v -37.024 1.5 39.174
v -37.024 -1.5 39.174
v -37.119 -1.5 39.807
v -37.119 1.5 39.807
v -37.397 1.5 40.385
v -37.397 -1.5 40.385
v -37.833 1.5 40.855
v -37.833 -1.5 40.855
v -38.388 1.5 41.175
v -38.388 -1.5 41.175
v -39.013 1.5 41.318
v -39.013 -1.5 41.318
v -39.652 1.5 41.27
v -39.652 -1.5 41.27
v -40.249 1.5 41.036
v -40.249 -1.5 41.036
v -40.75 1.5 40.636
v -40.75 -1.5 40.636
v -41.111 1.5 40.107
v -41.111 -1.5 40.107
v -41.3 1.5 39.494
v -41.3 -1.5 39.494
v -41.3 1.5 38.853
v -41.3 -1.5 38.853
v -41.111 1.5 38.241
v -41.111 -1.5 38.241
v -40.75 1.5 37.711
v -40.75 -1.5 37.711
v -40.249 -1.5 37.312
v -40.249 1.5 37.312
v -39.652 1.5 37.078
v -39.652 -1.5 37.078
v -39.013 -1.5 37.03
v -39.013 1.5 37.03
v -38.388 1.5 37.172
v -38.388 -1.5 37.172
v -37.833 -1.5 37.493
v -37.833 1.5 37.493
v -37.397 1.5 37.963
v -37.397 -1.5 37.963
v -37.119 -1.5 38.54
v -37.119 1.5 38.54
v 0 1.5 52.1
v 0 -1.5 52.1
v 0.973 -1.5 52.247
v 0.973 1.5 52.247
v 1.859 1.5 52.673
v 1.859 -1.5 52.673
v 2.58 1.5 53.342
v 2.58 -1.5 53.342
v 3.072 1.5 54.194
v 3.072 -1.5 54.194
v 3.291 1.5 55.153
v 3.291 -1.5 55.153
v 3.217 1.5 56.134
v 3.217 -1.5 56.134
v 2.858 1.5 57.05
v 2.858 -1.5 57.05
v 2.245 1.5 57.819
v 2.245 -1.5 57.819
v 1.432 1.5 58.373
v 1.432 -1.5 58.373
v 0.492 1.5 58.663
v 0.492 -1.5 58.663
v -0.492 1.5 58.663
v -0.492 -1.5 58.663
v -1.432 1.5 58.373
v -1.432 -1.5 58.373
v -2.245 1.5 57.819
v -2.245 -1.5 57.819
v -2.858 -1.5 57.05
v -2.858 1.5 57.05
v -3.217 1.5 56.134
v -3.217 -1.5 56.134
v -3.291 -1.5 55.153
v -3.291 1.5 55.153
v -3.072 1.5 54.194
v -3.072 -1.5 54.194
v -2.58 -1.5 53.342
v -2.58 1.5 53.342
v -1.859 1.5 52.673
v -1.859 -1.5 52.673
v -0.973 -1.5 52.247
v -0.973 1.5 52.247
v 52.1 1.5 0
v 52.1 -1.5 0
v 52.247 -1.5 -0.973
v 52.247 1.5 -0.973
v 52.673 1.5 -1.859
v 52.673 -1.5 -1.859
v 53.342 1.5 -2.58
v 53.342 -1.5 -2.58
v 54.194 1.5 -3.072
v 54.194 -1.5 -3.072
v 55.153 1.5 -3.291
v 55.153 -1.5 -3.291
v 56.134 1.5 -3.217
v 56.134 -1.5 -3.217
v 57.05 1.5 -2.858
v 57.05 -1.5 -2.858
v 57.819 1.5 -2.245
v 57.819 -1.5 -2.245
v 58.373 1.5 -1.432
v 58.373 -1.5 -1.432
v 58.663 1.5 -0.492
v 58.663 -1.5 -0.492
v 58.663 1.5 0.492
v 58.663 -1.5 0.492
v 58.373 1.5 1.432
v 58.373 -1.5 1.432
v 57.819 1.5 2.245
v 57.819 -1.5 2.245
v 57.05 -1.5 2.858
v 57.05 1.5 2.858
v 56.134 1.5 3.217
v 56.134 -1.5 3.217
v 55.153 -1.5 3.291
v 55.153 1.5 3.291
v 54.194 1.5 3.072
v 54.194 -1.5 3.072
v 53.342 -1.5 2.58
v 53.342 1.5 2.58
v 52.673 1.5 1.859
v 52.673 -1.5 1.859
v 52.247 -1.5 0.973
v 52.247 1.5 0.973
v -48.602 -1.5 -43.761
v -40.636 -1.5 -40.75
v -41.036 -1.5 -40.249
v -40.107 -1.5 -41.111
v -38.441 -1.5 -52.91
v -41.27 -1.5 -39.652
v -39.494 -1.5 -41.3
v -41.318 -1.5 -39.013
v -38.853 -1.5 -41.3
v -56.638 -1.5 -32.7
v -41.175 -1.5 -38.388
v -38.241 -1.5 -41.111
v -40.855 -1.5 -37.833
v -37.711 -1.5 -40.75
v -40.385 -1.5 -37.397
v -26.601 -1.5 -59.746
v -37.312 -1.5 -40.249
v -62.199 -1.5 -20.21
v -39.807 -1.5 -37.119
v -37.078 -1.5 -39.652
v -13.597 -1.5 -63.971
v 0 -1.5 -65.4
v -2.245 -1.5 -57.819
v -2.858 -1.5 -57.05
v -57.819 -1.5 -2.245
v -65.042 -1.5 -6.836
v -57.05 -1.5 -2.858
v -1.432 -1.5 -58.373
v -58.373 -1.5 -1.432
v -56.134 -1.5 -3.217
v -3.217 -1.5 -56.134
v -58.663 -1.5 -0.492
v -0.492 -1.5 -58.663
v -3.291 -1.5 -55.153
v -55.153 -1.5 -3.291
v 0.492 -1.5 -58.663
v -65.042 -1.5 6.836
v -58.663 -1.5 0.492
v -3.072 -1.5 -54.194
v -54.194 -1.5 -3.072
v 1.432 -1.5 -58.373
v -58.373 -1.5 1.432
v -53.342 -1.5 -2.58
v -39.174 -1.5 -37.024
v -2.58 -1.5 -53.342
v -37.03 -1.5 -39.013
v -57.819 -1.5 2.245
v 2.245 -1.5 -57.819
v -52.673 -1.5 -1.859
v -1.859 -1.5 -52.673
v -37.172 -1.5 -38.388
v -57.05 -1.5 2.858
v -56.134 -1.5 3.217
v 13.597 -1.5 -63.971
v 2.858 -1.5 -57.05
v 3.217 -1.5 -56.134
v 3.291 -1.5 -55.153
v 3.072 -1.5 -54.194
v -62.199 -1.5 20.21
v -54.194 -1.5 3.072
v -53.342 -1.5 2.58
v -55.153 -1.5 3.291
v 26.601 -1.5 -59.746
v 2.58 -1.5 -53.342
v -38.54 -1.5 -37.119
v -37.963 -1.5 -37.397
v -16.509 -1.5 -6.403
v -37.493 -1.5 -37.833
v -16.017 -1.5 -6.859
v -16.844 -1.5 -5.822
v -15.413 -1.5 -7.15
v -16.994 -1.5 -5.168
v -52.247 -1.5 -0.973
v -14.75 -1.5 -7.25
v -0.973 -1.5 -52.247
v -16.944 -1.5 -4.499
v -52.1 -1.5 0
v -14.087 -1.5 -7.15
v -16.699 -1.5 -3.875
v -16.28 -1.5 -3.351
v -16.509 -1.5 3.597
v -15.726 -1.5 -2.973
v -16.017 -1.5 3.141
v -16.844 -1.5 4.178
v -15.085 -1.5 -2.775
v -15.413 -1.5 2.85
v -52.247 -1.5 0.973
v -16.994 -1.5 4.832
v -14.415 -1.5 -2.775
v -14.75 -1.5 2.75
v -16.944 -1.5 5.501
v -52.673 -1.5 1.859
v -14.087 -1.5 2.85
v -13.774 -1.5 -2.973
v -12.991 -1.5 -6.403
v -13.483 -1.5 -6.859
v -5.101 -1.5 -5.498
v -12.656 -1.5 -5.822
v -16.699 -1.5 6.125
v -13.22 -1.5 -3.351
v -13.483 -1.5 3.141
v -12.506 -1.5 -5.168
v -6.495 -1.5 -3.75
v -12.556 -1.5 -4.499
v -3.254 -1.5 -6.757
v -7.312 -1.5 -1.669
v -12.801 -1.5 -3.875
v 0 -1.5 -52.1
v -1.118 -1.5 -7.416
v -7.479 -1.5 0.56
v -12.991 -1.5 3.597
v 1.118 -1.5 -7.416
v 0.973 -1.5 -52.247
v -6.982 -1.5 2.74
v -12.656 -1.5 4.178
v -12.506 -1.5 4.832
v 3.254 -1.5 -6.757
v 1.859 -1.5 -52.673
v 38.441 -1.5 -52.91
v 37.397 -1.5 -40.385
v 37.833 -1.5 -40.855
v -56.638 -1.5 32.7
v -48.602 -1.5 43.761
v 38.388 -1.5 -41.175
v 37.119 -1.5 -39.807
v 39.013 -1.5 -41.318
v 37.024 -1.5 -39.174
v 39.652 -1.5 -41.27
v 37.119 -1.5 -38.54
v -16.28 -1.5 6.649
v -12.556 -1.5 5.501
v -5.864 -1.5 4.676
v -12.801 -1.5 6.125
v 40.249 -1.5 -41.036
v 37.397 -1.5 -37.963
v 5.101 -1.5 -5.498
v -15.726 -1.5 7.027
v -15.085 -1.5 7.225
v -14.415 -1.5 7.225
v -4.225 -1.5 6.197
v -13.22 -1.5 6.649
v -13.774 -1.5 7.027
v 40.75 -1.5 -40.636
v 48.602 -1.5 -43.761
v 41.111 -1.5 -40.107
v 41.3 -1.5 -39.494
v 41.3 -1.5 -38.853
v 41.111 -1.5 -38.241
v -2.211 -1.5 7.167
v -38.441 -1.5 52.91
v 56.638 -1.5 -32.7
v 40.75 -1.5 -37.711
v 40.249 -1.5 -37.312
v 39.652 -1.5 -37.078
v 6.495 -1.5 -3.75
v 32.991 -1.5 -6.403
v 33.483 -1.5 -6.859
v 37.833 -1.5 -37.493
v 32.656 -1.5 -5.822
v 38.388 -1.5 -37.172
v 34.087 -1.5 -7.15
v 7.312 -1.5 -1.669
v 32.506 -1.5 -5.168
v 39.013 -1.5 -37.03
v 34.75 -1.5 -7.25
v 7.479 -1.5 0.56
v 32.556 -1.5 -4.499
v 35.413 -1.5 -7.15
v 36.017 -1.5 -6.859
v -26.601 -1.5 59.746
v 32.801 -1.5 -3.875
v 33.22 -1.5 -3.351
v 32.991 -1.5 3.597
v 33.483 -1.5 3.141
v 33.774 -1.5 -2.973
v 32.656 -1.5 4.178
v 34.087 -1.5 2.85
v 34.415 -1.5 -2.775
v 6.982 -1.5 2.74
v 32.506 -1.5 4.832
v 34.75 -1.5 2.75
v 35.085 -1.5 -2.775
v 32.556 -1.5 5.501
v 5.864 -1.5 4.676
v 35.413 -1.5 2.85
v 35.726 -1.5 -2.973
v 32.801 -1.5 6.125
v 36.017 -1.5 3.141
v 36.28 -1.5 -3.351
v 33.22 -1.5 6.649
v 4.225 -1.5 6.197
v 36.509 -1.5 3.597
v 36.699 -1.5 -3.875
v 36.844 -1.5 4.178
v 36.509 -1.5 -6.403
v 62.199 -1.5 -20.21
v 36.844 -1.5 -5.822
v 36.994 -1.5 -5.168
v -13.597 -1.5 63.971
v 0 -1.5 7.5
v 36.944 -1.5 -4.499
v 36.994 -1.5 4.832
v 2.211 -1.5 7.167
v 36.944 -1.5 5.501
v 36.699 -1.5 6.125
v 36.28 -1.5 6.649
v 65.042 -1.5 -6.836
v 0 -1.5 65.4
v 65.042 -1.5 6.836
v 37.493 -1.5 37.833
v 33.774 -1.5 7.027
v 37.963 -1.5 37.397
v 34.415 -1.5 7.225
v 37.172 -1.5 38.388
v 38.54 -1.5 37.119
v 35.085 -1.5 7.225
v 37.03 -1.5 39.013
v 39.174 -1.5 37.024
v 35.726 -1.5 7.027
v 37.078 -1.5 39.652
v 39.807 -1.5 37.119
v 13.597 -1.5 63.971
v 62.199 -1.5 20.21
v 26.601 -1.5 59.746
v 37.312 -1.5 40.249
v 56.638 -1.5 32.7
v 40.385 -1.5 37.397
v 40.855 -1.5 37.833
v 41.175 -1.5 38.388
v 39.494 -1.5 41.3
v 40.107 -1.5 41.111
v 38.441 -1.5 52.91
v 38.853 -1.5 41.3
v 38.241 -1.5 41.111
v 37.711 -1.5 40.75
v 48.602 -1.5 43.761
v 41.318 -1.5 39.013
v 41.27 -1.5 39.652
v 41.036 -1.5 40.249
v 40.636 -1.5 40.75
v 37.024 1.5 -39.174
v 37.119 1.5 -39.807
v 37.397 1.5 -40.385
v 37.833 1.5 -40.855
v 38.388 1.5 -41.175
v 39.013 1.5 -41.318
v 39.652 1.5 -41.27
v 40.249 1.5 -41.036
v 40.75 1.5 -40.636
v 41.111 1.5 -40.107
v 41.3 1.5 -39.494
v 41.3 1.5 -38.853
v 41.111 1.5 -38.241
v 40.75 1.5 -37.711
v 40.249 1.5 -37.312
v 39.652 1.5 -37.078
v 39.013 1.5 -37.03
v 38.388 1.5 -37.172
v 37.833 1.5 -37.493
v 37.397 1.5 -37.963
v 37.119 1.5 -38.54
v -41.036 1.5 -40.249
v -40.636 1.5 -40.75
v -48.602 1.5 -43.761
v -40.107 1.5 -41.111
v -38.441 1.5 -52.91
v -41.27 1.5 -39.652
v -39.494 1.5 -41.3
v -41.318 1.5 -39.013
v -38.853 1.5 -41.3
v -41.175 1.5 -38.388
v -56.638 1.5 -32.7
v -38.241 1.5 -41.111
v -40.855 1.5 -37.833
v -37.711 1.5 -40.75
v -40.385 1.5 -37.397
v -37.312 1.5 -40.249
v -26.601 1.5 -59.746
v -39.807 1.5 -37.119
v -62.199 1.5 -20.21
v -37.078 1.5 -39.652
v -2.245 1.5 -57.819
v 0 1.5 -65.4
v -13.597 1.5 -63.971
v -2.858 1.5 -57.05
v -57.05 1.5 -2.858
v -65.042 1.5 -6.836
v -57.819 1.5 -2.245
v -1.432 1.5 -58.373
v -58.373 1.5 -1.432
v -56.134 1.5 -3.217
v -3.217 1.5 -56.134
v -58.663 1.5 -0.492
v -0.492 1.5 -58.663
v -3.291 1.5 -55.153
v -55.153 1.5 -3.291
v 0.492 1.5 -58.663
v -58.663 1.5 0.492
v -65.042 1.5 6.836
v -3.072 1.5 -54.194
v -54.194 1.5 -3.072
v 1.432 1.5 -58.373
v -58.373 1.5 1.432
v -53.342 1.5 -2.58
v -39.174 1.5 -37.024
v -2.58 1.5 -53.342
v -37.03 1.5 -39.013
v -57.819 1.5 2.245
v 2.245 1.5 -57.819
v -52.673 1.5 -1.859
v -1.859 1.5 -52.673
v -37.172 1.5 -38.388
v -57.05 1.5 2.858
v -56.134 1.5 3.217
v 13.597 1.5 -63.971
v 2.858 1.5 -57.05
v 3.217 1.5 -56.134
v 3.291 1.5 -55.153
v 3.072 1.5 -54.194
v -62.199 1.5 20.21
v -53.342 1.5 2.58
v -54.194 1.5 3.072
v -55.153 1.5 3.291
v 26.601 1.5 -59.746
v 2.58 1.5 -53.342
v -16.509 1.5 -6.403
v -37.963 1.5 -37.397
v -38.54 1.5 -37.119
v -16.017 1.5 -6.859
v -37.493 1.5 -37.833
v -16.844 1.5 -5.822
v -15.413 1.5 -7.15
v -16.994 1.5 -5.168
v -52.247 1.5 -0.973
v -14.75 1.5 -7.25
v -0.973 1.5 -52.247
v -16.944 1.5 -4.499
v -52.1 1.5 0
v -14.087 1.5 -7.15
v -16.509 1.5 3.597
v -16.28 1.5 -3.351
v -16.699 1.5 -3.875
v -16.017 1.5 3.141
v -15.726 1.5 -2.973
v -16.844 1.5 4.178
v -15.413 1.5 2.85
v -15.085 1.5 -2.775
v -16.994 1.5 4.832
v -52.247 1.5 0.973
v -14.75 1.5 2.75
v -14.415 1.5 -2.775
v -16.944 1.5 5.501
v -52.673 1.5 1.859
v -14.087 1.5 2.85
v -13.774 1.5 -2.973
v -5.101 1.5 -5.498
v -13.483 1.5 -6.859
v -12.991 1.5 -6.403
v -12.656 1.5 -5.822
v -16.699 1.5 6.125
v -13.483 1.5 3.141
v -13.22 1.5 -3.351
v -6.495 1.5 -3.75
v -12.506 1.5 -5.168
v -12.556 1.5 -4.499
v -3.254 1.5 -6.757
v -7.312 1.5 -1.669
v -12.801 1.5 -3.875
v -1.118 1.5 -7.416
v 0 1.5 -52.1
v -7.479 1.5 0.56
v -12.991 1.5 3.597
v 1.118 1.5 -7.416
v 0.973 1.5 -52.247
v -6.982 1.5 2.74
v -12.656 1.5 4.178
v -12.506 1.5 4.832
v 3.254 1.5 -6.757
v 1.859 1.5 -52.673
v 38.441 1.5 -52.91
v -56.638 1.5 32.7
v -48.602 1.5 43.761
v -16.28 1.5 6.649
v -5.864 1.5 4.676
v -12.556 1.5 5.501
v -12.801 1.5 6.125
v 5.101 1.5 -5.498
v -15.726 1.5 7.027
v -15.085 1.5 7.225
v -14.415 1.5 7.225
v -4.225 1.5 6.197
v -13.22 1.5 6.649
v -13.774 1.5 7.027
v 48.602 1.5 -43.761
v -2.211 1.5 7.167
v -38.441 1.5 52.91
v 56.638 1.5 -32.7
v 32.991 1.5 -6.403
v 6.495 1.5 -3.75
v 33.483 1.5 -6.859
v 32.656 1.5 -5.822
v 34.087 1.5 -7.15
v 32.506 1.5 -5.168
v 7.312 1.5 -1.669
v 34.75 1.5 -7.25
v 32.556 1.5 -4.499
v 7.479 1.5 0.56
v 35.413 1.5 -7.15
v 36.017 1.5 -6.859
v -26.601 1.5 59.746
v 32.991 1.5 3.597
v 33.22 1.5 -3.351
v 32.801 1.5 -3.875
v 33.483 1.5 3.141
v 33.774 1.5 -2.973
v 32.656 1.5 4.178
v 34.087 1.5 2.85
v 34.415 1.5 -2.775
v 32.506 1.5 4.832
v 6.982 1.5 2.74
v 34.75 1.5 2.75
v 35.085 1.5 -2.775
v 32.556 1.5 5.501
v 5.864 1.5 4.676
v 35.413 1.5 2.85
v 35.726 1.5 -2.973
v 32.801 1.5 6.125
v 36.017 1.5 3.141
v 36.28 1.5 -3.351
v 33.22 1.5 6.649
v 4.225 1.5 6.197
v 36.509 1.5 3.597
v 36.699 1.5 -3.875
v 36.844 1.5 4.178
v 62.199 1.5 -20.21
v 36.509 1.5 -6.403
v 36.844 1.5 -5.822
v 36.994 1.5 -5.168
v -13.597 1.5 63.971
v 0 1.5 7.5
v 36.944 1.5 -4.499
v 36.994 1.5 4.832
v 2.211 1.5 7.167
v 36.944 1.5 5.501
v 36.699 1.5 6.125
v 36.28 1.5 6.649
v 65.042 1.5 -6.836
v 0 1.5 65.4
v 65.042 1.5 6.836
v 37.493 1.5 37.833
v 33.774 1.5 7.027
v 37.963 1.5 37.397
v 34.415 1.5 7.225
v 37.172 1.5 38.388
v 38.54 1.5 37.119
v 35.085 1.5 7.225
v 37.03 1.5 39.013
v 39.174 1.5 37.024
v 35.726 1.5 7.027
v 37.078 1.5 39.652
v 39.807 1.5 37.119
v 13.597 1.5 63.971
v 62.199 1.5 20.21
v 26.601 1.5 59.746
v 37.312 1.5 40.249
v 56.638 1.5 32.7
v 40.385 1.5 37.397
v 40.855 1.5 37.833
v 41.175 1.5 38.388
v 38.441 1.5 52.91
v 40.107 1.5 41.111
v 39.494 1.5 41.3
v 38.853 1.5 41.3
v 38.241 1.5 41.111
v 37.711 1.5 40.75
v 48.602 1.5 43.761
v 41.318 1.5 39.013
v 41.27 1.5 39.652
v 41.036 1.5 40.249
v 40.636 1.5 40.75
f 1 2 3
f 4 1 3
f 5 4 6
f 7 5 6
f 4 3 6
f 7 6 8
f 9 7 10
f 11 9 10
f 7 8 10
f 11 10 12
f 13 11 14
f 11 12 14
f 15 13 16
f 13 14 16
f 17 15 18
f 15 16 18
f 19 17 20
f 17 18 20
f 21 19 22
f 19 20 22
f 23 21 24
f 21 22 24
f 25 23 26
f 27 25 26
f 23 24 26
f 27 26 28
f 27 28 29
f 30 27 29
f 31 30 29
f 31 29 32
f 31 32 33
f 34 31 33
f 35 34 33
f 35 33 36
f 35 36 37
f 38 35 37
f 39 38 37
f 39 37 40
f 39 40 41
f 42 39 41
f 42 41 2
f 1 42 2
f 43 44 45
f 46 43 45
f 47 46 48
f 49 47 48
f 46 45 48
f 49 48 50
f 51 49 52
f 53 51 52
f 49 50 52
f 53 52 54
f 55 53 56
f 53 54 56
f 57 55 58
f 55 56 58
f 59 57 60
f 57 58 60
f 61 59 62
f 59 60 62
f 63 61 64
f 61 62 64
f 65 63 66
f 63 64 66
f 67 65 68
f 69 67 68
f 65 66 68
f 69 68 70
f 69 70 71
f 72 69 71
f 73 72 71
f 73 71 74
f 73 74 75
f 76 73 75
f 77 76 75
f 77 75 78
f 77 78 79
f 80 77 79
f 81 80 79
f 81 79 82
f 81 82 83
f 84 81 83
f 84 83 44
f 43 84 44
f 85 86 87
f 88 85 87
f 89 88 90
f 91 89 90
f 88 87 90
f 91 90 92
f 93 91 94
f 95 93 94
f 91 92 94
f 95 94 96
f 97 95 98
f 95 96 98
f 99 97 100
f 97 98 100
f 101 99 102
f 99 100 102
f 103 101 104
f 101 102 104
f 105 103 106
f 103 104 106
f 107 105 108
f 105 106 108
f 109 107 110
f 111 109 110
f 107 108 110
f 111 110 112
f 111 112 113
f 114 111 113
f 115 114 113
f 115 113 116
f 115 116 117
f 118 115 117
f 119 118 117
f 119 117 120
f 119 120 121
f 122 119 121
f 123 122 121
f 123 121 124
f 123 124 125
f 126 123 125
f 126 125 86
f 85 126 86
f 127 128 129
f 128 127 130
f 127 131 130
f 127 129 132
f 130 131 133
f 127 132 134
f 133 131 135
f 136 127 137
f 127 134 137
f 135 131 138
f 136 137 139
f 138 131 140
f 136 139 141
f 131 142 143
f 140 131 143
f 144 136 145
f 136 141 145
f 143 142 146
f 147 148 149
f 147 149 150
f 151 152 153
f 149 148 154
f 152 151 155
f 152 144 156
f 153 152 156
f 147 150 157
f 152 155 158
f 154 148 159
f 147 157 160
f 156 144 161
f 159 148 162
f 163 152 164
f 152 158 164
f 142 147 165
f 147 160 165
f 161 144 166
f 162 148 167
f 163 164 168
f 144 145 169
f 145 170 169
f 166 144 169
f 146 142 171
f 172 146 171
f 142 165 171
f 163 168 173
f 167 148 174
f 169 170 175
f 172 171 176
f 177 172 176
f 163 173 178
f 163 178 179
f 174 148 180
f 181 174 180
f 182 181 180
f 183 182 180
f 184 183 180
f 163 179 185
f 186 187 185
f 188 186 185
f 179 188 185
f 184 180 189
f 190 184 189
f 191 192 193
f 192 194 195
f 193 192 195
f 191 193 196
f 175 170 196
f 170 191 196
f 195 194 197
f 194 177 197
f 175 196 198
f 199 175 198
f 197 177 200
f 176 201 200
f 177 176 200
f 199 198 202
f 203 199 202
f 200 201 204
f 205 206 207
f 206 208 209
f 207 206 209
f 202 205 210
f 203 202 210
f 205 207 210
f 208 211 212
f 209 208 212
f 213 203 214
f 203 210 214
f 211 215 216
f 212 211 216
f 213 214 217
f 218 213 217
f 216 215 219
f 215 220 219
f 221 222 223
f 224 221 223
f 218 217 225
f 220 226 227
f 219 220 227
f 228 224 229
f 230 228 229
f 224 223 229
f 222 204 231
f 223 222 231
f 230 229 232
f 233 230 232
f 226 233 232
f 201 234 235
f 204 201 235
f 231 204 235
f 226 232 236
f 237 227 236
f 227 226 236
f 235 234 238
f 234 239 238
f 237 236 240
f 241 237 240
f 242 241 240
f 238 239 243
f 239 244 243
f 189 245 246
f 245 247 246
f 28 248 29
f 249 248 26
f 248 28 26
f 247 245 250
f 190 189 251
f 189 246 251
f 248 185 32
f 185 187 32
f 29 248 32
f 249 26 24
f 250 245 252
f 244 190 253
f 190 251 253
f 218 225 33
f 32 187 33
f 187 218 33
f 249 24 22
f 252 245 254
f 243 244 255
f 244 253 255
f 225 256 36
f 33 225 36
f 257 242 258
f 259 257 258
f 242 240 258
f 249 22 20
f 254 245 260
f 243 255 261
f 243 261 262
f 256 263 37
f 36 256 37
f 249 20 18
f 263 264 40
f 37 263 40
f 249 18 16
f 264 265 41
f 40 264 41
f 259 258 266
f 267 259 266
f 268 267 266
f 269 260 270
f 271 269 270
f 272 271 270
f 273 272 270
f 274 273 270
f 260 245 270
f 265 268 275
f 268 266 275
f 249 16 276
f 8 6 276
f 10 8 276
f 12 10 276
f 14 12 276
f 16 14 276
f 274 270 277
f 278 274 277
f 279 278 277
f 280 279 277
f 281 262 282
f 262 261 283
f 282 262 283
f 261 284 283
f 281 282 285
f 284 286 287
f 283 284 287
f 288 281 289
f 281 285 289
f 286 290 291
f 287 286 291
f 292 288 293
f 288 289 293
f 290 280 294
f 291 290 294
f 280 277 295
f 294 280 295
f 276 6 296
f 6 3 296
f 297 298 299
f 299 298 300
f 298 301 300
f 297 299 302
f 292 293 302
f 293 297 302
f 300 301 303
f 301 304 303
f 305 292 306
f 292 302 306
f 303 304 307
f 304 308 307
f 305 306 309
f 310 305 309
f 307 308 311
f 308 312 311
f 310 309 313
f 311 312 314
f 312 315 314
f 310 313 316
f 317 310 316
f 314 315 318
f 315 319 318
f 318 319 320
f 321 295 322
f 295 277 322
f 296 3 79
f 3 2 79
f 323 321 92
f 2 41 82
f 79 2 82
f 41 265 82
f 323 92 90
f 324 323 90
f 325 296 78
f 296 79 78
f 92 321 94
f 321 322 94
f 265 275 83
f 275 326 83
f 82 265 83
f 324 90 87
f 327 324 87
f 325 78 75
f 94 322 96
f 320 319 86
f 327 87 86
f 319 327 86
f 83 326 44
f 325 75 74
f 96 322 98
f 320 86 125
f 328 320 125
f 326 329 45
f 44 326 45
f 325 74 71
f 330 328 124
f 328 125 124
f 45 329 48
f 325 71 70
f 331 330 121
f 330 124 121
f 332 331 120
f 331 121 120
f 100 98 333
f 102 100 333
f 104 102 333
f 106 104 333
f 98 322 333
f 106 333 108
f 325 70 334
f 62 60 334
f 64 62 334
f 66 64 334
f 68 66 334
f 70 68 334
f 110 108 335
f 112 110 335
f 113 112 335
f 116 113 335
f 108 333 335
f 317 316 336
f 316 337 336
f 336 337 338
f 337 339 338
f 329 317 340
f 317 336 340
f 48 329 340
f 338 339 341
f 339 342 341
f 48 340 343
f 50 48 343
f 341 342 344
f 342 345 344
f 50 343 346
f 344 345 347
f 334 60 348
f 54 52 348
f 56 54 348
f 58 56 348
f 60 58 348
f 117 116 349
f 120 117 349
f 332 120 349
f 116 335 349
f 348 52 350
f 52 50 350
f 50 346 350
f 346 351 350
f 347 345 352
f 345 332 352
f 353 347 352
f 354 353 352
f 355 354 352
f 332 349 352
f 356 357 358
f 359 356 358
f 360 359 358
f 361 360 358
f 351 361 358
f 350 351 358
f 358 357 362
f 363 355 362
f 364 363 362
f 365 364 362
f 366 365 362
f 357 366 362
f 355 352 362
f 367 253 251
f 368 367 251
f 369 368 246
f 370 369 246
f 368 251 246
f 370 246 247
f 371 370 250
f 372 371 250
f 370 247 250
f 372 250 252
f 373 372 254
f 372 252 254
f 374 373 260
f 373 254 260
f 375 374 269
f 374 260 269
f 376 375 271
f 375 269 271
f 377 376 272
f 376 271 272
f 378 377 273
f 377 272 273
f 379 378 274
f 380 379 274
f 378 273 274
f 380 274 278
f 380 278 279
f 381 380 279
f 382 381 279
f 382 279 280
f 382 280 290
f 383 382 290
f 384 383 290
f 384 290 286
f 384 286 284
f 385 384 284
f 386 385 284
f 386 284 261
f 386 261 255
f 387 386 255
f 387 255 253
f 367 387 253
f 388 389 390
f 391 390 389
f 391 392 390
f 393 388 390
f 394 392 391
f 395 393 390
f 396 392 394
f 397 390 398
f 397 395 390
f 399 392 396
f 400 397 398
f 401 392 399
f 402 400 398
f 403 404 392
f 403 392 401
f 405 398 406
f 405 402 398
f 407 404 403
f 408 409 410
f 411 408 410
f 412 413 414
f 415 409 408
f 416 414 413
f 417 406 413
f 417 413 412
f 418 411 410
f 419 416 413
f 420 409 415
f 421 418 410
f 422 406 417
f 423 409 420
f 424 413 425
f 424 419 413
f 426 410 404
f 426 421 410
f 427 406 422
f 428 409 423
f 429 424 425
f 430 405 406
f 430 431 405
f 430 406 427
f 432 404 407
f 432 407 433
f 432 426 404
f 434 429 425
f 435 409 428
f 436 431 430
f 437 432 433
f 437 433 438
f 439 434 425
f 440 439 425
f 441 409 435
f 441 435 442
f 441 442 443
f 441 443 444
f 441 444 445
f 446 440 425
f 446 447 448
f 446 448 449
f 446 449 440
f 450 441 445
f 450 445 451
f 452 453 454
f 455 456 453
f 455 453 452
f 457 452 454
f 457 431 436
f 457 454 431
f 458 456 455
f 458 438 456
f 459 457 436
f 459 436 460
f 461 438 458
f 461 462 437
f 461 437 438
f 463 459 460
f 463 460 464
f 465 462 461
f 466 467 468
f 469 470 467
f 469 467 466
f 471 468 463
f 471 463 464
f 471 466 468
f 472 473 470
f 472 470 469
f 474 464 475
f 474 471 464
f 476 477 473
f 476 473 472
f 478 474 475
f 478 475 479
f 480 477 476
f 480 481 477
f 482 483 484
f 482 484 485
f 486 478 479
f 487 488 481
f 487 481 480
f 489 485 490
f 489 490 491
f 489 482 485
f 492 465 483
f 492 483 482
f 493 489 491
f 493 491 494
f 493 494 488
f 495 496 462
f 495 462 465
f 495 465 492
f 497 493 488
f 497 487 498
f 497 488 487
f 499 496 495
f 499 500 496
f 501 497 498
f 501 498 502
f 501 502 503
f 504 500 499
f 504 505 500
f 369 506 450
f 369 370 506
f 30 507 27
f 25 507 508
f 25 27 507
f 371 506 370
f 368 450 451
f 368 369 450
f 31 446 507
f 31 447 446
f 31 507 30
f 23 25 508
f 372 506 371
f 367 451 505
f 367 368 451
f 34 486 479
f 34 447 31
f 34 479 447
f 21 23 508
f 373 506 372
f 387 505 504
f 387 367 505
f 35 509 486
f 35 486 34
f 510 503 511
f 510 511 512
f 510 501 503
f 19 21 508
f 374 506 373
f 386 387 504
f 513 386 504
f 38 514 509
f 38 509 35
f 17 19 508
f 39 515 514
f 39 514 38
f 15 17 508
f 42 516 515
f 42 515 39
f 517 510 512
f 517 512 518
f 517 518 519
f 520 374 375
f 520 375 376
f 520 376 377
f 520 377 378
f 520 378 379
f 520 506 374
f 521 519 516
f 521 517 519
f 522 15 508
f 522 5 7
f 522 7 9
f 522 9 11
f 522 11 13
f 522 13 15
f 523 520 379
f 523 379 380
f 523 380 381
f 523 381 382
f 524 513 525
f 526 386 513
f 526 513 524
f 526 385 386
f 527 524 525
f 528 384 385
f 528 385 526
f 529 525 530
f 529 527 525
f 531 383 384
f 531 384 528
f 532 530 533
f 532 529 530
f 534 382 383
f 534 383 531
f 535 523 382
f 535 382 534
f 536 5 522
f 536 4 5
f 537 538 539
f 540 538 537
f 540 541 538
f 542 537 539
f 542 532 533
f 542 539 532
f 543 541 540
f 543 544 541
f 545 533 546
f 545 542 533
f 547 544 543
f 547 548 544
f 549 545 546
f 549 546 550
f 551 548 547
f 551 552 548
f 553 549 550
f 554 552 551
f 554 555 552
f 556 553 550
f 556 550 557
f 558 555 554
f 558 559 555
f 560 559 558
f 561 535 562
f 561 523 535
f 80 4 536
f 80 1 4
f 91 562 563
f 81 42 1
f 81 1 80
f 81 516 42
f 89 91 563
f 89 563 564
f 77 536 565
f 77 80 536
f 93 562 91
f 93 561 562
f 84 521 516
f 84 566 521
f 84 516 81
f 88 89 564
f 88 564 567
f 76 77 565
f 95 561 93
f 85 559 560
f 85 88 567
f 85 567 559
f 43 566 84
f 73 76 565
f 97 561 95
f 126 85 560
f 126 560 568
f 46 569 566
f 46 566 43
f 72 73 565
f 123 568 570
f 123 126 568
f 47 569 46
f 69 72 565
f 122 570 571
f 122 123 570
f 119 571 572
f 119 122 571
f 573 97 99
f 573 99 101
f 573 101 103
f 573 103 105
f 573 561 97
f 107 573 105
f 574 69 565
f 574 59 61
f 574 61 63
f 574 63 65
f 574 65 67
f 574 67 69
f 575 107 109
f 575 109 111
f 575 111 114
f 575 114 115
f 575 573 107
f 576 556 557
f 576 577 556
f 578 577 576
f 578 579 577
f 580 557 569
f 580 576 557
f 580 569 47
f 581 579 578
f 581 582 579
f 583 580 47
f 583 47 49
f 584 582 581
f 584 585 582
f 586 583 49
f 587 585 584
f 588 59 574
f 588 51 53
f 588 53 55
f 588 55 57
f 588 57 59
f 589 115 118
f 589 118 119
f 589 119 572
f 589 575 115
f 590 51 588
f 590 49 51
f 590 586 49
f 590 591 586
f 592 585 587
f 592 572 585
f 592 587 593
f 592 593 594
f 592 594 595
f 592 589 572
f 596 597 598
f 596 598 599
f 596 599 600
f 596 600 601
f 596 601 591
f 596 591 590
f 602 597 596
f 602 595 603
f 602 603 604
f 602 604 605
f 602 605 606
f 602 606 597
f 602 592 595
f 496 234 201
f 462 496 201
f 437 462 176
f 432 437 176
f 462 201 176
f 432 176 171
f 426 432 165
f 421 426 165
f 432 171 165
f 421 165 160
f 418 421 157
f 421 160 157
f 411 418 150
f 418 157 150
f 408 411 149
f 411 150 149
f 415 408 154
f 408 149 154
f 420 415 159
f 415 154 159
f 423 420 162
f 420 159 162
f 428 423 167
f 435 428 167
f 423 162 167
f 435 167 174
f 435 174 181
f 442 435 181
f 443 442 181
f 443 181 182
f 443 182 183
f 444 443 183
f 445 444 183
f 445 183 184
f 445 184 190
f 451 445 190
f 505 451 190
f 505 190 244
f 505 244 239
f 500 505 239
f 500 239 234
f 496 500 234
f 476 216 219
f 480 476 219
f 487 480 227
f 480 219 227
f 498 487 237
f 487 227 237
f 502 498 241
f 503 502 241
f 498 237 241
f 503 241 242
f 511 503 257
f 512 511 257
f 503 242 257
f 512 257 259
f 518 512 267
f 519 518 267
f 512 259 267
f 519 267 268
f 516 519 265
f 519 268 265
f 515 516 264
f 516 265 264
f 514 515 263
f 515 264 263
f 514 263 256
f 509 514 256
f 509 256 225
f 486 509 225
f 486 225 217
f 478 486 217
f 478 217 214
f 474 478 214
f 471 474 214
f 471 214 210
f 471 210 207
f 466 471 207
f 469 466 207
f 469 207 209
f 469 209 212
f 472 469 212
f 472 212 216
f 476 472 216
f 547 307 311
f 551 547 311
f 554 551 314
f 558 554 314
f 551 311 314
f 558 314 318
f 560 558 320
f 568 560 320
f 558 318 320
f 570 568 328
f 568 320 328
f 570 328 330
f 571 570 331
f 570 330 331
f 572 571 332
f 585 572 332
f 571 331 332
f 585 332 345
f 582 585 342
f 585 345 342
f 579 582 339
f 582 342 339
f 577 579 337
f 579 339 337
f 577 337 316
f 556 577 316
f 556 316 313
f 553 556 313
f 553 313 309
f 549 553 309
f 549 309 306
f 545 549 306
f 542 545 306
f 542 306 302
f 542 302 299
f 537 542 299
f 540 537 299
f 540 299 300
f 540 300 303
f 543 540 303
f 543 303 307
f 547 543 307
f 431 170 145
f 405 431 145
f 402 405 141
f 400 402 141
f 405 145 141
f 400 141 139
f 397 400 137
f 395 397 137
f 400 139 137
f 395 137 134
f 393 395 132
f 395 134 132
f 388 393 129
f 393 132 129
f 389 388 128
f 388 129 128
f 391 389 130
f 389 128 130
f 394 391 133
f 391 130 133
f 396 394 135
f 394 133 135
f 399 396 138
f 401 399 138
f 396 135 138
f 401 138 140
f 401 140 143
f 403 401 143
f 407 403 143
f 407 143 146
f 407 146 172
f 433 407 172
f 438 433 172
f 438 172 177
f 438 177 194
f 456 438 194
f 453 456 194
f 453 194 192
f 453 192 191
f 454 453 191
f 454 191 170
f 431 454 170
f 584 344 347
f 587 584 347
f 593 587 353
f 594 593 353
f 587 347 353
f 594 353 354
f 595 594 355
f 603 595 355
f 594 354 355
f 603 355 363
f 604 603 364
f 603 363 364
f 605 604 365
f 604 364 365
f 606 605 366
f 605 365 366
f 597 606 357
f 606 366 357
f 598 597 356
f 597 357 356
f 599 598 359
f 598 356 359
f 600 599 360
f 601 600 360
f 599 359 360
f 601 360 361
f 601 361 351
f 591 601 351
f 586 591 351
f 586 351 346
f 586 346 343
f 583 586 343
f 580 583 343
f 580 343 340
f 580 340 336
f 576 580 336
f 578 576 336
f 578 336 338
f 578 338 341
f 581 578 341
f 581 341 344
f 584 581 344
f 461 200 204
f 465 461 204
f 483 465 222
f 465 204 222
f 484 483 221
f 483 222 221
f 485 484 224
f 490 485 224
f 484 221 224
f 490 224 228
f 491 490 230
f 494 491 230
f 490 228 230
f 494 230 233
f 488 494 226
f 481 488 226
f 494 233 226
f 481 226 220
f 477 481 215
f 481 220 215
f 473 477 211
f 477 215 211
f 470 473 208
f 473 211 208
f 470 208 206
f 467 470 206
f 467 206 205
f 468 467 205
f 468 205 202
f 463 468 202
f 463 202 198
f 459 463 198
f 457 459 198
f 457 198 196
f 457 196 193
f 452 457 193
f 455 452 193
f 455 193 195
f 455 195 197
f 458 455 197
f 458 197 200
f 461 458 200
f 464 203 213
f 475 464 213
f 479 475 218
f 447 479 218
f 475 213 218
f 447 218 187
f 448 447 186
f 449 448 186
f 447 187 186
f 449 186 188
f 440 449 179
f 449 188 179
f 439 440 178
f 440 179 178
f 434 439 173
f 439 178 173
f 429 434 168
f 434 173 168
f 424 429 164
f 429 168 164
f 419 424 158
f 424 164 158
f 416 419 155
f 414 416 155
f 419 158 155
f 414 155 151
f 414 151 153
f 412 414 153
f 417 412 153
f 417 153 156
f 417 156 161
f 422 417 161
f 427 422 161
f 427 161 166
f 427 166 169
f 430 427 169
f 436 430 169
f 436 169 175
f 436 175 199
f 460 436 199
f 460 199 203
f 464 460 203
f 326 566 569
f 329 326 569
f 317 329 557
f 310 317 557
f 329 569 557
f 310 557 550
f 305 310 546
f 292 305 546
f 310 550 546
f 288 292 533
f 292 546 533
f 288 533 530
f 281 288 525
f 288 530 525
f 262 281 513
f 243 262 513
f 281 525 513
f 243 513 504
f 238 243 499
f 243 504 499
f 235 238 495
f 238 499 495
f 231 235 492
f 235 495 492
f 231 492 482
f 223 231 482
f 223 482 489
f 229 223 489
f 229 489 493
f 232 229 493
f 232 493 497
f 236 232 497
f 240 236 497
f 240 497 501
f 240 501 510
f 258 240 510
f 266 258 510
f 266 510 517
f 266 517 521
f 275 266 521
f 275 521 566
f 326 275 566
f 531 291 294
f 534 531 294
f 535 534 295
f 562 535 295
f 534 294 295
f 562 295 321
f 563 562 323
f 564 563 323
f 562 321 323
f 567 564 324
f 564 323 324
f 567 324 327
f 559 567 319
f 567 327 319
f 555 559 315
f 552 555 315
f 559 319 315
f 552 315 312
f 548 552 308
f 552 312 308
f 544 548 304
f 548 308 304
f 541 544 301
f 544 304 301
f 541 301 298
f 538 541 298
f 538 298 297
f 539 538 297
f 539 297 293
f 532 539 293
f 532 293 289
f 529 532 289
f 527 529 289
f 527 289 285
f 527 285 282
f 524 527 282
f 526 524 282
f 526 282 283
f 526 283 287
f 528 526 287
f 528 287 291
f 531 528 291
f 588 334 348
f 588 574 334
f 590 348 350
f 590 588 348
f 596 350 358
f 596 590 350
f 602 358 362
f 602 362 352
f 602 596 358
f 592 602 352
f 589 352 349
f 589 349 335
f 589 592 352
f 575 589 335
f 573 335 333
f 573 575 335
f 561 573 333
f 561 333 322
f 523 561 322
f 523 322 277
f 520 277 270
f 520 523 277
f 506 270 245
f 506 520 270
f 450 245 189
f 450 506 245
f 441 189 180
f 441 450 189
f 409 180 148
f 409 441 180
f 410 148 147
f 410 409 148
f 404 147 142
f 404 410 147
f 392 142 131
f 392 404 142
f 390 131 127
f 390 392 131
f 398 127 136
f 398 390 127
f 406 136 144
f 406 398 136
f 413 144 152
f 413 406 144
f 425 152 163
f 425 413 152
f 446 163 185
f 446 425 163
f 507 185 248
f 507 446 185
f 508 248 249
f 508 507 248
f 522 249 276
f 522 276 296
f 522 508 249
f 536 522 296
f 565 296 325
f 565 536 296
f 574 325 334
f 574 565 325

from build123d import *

# Parameters (mm, degrees)
SKETCH1_R            = 65.4
BOSS_EXTRUDE1_DEPTH  = 1.5
M6_CLEARANCE_HOLE1_D = 6.6
CIRPATTERN2_COUNT    = 4
M4_CLEARANCE_HOLE1_D = 4.3
CIRPATTERN1_COUNT    = 4
SKETCH10_R           = 7.5
CUT_EXTRUDE1_DEPTH   = 93.538208325
SKETCH11_R           = 2.25
CUT_EXTRUDE2_DEPTH   = 93.538208325


with BuildPart() as part:
    # Sketch1 → Boss-Extrude1 (new, symmetric)
    with BuildSketch(Plane(origin=(0, 0, 0), x_dir=(1, 0, 0), z_dir=(0, 1, 0))):
        with Locations(Location((0, 0, 0), (0, 0, 270))):
            Circle(SKETCH1_R)
    extrude(amount=BOSS_EXTRUDE1_DEPTH, both=True)

    # M6 Clearance Hole1 (through all)
    with Locations(Plane(origin=(0, 1.5, 0), x_dir=(1, 0, 0), z_dir=(0, 1, 0))):
        with Locations((55.4, 0)):
            m6_clearance_hole1 = Hole(M6_CLEARANCE_HOLE1_D / 2)

    # CirPattern2: M6 Clearance Hole1 ×4 about axis
    cirpattern2_axis = Axis((0, 0, 0), (0, 1, 0))
    for i in range(1, CIRPATTERN2_COUNT):
        add(m6_clearance_hole1.rotate(cirpattern2_axis, i * 360 / CIRPATTERN2_COUNT), mode=Mode.SUBTRACT)

    # M4 Clearance Hole1 (through all)
    with Locations(Plane(origin=(0, 1.5, 0), x_dir=(1, 0, 0), z_dir=(0, 1, 0))):
        with Locations((39.173715678, 39.173715678)):
            m4_clearance_hole1 = Hole(M4_CLEARANCE_HOLE1_D / 2)

    # CirPattern1: M4 Clearance Hole1 ×4 about axis
    cirpattern1_axis = Axis((0, 0, 0), (0, 1, 0))
    for i in range(1, CIRPATTERN1_COUNT):
        add(m4_clearance_hole1.rotate(cirpattern1_axis, i * 360 / CIRPATTERN1_COUNT), mode=Mode.SUBTRACT)

    # Sketch10 → Cut-Extrude1 (cut, through all)
    with BuildSketch(Plane(origin=(0, 1.5, 0), x_dir=(1, 0, 0), z_dir=(0, 1, 0))):
        with Locations(Location((0, 0, 0), (0, 0, 270))):
            Circle(SKETCH10_R)
    extrude(amount=-CUT_EXTRUDE1_DEPTH, mode=Mode.SUBTRACT)

    # Sketch11 → Cut-Extrude2 (cut, through all)
    with BuildSketch(Plane.XZ.offset(1.5)):
        with Locations(Location((-14.75, -5, 0), (0, 0, 270))):
            Circle(SKETCH11_R)
        with Locations(Location((-14.75, 5, 0), (0, 0, 270))):
            Circle(SKETCH11_R)
        with Locations(Location((34.75, -5, 0), (0, 0, 270))):
            Circle(SKETCH11_R)
        with Locations(Location((34.75, 5, 0), (0, 0, 270))):
            Circle(SKETCH11_R)
    extrude(amount=-CUT_EXTRUDE2_DEPTH, mode=Mode.SUBTRACT)


solid = part.part
